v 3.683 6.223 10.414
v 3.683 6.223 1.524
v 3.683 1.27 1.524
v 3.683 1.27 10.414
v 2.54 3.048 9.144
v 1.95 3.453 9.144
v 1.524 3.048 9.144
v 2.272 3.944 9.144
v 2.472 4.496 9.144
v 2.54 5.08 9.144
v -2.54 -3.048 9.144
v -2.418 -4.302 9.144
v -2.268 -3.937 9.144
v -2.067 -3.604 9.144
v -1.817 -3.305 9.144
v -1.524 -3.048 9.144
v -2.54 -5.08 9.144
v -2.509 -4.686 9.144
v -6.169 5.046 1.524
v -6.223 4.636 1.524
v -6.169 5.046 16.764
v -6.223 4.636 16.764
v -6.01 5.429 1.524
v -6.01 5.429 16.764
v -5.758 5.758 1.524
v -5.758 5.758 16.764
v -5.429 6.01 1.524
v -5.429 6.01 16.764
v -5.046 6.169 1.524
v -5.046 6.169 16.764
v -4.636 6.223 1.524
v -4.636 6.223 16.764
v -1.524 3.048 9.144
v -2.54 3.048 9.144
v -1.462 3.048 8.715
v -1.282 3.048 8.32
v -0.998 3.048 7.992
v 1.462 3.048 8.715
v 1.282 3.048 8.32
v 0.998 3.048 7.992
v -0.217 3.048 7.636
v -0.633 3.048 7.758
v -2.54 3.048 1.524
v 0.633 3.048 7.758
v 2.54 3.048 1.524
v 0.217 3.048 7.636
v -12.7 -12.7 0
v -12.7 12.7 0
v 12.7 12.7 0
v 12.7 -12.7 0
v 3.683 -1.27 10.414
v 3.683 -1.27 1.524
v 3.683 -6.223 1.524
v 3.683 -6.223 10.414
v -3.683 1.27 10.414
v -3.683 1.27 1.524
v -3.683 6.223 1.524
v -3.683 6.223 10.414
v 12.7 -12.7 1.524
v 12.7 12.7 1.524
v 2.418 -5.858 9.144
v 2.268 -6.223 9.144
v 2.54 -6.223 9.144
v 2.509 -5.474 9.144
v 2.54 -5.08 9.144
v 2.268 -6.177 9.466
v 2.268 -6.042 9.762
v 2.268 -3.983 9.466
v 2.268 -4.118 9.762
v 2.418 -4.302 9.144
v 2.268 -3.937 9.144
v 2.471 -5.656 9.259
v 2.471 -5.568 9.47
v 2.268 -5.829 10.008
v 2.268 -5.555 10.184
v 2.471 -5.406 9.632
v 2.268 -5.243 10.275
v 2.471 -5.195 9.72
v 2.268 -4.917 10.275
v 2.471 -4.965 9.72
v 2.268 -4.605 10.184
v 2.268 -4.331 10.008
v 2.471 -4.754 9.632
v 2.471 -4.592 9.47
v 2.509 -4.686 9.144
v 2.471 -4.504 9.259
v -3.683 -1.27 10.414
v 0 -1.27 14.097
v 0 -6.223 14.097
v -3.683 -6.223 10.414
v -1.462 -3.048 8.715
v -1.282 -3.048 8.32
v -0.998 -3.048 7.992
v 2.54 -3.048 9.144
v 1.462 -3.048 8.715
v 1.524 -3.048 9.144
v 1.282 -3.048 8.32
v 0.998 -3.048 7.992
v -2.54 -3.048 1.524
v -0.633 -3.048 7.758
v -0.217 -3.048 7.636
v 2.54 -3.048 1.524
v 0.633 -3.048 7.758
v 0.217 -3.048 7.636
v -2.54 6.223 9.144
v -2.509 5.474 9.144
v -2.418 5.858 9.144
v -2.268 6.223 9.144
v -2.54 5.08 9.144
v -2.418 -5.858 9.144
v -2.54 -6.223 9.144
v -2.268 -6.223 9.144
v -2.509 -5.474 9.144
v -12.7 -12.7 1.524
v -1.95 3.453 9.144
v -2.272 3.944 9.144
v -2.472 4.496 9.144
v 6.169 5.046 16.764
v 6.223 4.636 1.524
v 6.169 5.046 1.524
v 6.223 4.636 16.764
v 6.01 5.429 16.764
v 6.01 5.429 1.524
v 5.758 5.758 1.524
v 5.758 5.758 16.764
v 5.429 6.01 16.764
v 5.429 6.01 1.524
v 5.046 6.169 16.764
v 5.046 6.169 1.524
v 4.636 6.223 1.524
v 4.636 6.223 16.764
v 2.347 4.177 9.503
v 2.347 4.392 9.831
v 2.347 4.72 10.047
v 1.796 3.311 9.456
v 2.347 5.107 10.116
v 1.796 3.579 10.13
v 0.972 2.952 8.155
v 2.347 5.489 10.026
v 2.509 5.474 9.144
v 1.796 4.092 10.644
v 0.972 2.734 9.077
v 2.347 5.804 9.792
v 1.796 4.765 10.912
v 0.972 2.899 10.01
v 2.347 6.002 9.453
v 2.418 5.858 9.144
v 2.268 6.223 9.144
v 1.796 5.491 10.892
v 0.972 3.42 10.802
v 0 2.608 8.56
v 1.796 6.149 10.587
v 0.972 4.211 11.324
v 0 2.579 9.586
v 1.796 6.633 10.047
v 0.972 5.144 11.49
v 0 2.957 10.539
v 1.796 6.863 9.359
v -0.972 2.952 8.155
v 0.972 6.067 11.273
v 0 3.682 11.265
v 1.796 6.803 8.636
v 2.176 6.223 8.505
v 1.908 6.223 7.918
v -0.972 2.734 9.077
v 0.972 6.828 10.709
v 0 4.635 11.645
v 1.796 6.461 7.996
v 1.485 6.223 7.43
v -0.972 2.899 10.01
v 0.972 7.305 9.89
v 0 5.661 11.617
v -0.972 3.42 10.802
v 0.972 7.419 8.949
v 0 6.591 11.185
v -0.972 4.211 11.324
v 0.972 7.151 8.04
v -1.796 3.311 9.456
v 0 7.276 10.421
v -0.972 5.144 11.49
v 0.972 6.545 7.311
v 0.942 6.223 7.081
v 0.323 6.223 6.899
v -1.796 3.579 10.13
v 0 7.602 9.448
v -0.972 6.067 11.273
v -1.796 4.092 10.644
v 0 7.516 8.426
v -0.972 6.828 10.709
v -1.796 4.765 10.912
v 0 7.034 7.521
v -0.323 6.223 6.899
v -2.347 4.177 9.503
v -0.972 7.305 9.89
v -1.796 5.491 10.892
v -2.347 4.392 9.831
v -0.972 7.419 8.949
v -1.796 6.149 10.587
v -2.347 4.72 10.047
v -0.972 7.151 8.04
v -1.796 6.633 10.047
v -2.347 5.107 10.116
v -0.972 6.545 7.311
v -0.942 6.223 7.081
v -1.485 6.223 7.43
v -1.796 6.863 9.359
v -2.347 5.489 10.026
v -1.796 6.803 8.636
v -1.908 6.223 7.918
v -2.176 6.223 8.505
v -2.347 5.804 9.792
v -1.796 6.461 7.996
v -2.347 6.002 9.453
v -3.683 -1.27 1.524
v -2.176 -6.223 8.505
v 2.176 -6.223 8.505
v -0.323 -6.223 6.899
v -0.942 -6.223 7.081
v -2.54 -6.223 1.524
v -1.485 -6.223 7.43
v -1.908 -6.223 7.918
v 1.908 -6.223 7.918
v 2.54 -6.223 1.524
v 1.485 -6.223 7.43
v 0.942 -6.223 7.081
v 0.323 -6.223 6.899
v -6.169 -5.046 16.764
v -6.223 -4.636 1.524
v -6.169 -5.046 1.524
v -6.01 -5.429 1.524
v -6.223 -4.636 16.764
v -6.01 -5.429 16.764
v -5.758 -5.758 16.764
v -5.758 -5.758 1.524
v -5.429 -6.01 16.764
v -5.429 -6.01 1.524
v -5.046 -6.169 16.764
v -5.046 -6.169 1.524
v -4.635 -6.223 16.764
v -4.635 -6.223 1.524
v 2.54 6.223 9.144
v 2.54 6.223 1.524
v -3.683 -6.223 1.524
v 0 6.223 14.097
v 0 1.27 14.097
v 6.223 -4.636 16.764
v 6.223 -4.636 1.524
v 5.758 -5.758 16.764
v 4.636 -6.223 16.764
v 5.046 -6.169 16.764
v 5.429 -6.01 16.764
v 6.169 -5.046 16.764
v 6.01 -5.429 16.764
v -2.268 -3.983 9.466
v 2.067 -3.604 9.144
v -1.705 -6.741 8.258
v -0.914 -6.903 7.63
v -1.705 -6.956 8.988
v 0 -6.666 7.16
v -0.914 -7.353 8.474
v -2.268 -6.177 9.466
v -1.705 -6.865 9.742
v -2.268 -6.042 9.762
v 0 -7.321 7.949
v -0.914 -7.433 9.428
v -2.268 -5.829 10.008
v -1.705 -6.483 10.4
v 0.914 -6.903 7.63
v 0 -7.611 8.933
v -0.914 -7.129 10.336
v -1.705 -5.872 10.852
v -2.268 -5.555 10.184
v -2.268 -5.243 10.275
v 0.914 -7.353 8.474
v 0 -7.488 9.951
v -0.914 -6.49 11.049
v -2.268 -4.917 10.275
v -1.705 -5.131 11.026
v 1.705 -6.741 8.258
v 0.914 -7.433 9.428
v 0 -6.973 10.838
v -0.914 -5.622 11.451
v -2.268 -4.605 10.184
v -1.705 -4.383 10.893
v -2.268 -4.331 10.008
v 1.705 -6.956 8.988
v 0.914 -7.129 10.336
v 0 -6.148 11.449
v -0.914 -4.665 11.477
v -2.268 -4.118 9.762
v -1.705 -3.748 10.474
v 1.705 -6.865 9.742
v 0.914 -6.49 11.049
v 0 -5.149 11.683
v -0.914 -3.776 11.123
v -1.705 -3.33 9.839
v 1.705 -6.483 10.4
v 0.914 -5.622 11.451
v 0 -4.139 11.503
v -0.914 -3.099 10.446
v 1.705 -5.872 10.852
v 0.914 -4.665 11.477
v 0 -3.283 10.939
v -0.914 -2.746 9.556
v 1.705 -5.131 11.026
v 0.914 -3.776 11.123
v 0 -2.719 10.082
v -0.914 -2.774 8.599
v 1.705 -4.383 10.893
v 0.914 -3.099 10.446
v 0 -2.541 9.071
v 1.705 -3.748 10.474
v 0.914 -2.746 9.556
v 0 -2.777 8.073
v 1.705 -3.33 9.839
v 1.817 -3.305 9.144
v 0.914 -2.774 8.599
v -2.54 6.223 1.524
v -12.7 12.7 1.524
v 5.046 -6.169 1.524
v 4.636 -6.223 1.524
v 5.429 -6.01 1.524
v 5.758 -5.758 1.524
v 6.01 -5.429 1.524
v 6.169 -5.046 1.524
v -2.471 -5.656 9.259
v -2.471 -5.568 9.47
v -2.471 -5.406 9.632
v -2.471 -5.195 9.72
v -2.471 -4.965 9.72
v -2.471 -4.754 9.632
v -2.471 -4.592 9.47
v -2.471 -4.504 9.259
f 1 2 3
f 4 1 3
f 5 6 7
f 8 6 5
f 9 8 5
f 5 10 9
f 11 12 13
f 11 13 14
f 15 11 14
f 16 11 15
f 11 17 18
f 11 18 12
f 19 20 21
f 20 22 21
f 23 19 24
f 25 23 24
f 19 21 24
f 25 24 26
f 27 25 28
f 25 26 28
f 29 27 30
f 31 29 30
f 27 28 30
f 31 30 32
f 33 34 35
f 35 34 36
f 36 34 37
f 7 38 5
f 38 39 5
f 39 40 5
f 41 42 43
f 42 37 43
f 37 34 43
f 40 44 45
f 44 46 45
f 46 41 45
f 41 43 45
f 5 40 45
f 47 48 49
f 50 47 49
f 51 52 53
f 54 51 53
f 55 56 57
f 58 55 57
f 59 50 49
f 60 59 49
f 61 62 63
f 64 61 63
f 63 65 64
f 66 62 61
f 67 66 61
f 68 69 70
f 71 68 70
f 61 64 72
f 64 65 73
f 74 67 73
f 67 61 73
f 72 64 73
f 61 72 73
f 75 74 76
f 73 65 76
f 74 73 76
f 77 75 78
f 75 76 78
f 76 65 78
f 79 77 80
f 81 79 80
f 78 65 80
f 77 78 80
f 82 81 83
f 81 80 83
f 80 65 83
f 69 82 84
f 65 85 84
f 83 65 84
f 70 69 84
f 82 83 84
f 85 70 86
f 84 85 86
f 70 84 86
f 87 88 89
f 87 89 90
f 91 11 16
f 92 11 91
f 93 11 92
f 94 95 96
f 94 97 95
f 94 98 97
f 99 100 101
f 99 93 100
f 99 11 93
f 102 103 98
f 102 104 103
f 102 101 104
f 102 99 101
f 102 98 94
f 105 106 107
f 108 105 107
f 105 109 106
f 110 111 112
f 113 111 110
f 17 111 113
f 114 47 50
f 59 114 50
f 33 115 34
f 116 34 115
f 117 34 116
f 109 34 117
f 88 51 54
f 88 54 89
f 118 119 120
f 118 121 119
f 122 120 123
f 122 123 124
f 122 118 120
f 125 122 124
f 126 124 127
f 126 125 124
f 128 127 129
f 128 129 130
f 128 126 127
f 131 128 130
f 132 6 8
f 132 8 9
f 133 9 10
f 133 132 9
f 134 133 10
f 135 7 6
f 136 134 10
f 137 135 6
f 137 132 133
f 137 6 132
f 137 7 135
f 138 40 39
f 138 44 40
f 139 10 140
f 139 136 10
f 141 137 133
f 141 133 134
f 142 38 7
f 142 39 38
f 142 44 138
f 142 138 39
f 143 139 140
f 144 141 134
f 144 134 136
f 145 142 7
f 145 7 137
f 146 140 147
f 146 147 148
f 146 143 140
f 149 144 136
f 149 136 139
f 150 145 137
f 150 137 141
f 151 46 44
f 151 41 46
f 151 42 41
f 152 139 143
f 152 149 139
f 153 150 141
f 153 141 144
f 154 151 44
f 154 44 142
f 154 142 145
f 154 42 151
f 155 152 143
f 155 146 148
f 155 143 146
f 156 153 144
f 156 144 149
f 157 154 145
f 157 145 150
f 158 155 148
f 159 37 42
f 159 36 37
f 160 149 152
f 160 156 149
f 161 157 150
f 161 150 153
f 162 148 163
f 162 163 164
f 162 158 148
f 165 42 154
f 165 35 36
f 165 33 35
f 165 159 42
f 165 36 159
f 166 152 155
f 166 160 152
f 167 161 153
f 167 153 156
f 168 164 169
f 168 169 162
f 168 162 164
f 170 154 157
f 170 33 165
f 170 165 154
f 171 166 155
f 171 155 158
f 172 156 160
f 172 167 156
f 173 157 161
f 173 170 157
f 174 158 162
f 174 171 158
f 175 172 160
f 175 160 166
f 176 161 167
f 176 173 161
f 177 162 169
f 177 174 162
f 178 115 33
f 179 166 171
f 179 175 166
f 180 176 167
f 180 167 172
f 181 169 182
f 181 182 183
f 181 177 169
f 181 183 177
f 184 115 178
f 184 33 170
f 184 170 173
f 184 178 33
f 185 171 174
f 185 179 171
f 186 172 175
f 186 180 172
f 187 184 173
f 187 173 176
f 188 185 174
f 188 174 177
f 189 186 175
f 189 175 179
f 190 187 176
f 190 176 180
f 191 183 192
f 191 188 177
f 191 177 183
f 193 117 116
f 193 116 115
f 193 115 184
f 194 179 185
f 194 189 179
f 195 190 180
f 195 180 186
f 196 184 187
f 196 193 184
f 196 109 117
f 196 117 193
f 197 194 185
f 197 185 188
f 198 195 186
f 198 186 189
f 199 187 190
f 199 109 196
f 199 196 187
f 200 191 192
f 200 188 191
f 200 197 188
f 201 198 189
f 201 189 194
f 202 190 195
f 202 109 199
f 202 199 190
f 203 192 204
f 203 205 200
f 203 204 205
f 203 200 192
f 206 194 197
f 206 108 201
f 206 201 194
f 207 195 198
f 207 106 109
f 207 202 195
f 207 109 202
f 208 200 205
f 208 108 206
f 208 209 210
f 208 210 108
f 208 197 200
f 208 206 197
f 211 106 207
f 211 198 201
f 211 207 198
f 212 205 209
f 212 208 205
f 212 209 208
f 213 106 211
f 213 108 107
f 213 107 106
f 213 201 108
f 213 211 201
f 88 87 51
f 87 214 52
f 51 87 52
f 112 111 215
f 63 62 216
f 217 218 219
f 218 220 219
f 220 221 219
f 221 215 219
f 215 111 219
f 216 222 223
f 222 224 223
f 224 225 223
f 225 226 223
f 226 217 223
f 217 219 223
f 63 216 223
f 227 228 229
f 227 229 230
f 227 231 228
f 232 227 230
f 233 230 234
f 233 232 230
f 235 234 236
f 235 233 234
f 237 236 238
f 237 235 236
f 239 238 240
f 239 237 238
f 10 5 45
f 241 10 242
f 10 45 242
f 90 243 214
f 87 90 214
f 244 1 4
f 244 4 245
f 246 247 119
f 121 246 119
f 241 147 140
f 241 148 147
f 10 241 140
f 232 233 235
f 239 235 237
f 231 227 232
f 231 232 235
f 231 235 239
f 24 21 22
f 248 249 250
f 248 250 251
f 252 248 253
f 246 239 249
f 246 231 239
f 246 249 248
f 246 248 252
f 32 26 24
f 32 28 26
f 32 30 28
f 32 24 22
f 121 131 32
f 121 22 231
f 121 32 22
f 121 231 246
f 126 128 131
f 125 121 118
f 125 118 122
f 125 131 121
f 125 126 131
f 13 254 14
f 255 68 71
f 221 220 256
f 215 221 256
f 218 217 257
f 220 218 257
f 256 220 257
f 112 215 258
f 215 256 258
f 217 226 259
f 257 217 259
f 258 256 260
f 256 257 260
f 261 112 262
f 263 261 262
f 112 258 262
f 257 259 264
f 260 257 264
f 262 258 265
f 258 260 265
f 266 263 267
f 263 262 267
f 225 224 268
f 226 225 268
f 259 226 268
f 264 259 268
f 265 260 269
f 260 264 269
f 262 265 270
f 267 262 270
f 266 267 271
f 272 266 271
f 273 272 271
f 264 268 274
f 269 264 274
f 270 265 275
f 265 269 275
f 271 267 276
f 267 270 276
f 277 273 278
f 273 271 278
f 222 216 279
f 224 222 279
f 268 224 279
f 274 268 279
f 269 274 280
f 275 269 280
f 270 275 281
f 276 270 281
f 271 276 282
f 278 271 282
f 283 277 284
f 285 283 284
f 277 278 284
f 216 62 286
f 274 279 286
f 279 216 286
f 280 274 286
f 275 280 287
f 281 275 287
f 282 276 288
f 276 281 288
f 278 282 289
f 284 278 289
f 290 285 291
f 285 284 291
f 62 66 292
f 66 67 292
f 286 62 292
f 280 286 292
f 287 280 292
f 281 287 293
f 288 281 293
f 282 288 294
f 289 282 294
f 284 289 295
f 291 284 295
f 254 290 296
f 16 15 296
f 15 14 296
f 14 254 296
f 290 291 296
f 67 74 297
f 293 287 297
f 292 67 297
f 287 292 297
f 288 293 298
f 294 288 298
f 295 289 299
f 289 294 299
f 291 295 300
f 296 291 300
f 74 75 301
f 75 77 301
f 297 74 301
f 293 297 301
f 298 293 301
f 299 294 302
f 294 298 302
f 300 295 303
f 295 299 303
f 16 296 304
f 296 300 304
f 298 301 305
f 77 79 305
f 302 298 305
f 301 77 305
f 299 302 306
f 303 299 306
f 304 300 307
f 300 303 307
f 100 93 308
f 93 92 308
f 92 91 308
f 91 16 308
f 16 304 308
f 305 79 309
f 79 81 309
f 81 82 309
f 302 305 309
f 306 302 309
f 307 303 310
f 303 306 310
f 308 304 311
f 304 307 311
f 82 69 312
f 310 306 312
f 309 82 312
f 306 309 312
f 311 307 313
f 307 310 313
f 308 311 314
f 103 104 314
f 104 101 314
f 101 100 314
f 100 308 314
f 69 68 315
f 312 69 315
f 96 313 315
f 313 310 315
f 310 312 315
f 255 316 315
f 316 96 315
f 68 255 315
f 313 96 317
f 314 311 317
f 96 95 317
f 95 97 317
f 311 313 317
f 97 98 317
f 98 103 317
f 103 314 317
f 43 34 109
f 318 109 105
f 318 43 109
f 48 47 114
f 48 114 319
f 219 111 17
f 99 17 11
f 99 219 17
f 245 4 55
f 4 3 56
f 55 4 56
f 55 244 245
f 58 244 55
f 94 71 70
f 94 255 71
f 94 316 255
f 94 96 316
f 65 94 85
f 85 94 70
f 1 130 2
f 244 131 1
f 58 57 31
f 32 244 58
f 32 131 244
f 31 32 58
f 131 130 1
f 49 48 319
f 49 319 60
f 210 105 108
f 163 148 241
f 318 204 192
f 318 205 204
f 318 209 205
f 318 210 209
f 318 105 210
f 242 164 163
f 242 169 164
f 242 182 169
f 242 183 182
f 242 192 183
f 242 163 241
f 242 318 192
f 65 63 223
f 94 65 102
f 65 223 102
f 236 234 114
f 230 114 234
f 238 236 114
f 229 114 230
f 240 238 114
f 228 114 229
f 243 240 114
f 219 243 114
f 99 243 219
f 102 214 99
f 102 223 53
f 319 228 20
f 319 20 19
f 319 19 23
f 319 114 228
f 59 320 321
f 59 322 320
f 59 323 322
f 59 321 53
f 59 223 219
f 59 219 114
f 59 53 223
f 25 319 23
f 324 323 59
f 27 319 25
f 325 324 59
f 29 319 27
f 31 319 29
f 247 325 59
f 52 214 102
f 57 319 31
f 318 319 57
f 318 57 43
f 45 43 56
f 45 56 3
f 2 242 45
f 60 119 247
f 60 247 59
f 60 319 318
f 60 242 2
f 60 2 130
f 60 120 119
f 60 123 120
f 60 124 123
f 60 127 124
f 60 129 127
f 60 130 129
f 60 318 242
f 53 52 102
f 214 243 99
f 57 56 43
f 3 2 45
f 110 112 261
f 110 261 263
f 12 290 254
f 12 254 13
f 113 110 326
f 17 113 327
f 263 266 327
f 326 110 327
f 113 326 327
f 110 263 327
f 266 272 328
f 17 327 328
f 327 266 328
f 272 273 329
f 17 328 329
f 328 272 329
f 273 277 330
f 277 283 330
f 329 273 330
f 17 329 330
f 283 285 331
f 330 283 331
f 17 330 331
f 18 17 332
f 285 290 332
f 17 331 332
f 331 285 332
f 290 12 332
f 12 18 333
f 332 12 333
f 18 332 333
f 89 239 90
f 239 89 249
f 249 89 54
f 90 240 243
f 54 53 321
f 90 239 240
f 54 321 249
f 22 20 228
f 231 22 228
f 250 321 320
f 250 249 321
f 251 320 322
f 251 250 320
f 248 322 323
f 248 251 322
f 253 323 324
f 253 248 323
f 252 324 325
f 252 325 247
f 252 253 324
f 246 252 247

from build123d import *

# Parameters (mm, degrees)
F0_W     = 25.4
F0_H     = 25.4
F1_DEPTH = 1.524
F3_DEPTH = 15.24
F2_W     = 5.08
F2_H     = 3.175
F4_DEPTH = 7.62
F9_DEPTH = 12.446
F10_R    = 1.5875


with BuildPart() as f1:
    # F0 (on Top) → F1 (new body)
    with BuildSketch(Plane.XY):
        Rectangle(F0_W, F0_H)
    extrude(amount=F1_DEPTH)

    # F2 (on face) → F3 (join)
    with BuildSketch(Plane.XY.offset(1.524)):
        Polygon((6.223, -6.223), (6.223, 6.223), (3.683, 6.223), (3.683, 1.27), (-3.683, 1.27), (-3.683, 6.223), (-6.223, 6.223), (-6.223, -6.223), (-3.683, -6.223), (-3.683, -1.27), (3.683, -1.27), (3.683, -6.223), align=None)
    extrude(amount=F3_DEPTH)

    # F2 (on face) → F4 (join)
    with BuildSketch(Plane.XY.offset(1.524)):
        with Locations((0, -4.6355)):
            Rectangle(F2_W, F2_H)
        with Locations((0, 4.6355)):
            Rectangle(F2_W, F2_H)
    extrude(amount=F4_DEPTH)

    # F5 (on face) → F6 (revolve)
    with BuildSketch(Plane.XY.offset(9.144)):
        with BuildLine():
            Line((-2.54, 5.08), (2.54, 5.08))
            ThreePointArc((2.54, 5.08), (0, 7.62), (-2.54, 5.08))
        make_face()
    revolve(axis=Axis((0, 5.08, 9.144), (-1, 0, 0)))

    # F5 (on face) → F7 (revolve)
    with BuildSketch(Plane.XY.offset(9.144)):
        with BuildLine():
            ThreePointArc((-2.2682925296, -6.223), (0, -7.62), (2.2682925296, -6.223))
            Line((2.2682925296, -6.223), (-2.2682925296, -6.223))
        make_face()
        with BuildLine():
            ThreePointArc((2.2682925296, -6.223), (2.4711397194, -5.6674253036), (2.54, -5.08))
            Line((2.54, -5.08), (-2.54, -5.08))
            ThreePointArc((-2.54, -5.08), (-2.4711397194, -5.6674253036), (-2.2682925296, -6.223))
            Line((-2.2682925296, -6.223), (2.2682925296, -6.223))
        make_face()
    revolve(axis=Axis((0, -5.08, 9.144), (-1, 0, 0)))

    # F8 (on face) → F9 (join)
    with BuildSketch(Plane(origin=(0, 6.223, 0), x_dir=(-1, 0, 0), z_dir=(0, 1, 0))):
        Polygon((-3.683, 16.764), (-3.683, 10.414), (0, 14.097), (3.683, 10.414), (3.683, 16.764), align=None)
    extrude(amount=-F9_DEPTH)

    # F10
    f10_edges = [f1.edges().sort_by_distance(p)[0] for p in [
        (-6.223, -6.223, 9.144),
        (-6.223, 6.223, 9.144),
        (6.223, 6.223, 9.144),
        (6.223, -6.223, 9.144),
    ]]
    fillet(f10_edges, radius=F10_R)


solid = f1.part
